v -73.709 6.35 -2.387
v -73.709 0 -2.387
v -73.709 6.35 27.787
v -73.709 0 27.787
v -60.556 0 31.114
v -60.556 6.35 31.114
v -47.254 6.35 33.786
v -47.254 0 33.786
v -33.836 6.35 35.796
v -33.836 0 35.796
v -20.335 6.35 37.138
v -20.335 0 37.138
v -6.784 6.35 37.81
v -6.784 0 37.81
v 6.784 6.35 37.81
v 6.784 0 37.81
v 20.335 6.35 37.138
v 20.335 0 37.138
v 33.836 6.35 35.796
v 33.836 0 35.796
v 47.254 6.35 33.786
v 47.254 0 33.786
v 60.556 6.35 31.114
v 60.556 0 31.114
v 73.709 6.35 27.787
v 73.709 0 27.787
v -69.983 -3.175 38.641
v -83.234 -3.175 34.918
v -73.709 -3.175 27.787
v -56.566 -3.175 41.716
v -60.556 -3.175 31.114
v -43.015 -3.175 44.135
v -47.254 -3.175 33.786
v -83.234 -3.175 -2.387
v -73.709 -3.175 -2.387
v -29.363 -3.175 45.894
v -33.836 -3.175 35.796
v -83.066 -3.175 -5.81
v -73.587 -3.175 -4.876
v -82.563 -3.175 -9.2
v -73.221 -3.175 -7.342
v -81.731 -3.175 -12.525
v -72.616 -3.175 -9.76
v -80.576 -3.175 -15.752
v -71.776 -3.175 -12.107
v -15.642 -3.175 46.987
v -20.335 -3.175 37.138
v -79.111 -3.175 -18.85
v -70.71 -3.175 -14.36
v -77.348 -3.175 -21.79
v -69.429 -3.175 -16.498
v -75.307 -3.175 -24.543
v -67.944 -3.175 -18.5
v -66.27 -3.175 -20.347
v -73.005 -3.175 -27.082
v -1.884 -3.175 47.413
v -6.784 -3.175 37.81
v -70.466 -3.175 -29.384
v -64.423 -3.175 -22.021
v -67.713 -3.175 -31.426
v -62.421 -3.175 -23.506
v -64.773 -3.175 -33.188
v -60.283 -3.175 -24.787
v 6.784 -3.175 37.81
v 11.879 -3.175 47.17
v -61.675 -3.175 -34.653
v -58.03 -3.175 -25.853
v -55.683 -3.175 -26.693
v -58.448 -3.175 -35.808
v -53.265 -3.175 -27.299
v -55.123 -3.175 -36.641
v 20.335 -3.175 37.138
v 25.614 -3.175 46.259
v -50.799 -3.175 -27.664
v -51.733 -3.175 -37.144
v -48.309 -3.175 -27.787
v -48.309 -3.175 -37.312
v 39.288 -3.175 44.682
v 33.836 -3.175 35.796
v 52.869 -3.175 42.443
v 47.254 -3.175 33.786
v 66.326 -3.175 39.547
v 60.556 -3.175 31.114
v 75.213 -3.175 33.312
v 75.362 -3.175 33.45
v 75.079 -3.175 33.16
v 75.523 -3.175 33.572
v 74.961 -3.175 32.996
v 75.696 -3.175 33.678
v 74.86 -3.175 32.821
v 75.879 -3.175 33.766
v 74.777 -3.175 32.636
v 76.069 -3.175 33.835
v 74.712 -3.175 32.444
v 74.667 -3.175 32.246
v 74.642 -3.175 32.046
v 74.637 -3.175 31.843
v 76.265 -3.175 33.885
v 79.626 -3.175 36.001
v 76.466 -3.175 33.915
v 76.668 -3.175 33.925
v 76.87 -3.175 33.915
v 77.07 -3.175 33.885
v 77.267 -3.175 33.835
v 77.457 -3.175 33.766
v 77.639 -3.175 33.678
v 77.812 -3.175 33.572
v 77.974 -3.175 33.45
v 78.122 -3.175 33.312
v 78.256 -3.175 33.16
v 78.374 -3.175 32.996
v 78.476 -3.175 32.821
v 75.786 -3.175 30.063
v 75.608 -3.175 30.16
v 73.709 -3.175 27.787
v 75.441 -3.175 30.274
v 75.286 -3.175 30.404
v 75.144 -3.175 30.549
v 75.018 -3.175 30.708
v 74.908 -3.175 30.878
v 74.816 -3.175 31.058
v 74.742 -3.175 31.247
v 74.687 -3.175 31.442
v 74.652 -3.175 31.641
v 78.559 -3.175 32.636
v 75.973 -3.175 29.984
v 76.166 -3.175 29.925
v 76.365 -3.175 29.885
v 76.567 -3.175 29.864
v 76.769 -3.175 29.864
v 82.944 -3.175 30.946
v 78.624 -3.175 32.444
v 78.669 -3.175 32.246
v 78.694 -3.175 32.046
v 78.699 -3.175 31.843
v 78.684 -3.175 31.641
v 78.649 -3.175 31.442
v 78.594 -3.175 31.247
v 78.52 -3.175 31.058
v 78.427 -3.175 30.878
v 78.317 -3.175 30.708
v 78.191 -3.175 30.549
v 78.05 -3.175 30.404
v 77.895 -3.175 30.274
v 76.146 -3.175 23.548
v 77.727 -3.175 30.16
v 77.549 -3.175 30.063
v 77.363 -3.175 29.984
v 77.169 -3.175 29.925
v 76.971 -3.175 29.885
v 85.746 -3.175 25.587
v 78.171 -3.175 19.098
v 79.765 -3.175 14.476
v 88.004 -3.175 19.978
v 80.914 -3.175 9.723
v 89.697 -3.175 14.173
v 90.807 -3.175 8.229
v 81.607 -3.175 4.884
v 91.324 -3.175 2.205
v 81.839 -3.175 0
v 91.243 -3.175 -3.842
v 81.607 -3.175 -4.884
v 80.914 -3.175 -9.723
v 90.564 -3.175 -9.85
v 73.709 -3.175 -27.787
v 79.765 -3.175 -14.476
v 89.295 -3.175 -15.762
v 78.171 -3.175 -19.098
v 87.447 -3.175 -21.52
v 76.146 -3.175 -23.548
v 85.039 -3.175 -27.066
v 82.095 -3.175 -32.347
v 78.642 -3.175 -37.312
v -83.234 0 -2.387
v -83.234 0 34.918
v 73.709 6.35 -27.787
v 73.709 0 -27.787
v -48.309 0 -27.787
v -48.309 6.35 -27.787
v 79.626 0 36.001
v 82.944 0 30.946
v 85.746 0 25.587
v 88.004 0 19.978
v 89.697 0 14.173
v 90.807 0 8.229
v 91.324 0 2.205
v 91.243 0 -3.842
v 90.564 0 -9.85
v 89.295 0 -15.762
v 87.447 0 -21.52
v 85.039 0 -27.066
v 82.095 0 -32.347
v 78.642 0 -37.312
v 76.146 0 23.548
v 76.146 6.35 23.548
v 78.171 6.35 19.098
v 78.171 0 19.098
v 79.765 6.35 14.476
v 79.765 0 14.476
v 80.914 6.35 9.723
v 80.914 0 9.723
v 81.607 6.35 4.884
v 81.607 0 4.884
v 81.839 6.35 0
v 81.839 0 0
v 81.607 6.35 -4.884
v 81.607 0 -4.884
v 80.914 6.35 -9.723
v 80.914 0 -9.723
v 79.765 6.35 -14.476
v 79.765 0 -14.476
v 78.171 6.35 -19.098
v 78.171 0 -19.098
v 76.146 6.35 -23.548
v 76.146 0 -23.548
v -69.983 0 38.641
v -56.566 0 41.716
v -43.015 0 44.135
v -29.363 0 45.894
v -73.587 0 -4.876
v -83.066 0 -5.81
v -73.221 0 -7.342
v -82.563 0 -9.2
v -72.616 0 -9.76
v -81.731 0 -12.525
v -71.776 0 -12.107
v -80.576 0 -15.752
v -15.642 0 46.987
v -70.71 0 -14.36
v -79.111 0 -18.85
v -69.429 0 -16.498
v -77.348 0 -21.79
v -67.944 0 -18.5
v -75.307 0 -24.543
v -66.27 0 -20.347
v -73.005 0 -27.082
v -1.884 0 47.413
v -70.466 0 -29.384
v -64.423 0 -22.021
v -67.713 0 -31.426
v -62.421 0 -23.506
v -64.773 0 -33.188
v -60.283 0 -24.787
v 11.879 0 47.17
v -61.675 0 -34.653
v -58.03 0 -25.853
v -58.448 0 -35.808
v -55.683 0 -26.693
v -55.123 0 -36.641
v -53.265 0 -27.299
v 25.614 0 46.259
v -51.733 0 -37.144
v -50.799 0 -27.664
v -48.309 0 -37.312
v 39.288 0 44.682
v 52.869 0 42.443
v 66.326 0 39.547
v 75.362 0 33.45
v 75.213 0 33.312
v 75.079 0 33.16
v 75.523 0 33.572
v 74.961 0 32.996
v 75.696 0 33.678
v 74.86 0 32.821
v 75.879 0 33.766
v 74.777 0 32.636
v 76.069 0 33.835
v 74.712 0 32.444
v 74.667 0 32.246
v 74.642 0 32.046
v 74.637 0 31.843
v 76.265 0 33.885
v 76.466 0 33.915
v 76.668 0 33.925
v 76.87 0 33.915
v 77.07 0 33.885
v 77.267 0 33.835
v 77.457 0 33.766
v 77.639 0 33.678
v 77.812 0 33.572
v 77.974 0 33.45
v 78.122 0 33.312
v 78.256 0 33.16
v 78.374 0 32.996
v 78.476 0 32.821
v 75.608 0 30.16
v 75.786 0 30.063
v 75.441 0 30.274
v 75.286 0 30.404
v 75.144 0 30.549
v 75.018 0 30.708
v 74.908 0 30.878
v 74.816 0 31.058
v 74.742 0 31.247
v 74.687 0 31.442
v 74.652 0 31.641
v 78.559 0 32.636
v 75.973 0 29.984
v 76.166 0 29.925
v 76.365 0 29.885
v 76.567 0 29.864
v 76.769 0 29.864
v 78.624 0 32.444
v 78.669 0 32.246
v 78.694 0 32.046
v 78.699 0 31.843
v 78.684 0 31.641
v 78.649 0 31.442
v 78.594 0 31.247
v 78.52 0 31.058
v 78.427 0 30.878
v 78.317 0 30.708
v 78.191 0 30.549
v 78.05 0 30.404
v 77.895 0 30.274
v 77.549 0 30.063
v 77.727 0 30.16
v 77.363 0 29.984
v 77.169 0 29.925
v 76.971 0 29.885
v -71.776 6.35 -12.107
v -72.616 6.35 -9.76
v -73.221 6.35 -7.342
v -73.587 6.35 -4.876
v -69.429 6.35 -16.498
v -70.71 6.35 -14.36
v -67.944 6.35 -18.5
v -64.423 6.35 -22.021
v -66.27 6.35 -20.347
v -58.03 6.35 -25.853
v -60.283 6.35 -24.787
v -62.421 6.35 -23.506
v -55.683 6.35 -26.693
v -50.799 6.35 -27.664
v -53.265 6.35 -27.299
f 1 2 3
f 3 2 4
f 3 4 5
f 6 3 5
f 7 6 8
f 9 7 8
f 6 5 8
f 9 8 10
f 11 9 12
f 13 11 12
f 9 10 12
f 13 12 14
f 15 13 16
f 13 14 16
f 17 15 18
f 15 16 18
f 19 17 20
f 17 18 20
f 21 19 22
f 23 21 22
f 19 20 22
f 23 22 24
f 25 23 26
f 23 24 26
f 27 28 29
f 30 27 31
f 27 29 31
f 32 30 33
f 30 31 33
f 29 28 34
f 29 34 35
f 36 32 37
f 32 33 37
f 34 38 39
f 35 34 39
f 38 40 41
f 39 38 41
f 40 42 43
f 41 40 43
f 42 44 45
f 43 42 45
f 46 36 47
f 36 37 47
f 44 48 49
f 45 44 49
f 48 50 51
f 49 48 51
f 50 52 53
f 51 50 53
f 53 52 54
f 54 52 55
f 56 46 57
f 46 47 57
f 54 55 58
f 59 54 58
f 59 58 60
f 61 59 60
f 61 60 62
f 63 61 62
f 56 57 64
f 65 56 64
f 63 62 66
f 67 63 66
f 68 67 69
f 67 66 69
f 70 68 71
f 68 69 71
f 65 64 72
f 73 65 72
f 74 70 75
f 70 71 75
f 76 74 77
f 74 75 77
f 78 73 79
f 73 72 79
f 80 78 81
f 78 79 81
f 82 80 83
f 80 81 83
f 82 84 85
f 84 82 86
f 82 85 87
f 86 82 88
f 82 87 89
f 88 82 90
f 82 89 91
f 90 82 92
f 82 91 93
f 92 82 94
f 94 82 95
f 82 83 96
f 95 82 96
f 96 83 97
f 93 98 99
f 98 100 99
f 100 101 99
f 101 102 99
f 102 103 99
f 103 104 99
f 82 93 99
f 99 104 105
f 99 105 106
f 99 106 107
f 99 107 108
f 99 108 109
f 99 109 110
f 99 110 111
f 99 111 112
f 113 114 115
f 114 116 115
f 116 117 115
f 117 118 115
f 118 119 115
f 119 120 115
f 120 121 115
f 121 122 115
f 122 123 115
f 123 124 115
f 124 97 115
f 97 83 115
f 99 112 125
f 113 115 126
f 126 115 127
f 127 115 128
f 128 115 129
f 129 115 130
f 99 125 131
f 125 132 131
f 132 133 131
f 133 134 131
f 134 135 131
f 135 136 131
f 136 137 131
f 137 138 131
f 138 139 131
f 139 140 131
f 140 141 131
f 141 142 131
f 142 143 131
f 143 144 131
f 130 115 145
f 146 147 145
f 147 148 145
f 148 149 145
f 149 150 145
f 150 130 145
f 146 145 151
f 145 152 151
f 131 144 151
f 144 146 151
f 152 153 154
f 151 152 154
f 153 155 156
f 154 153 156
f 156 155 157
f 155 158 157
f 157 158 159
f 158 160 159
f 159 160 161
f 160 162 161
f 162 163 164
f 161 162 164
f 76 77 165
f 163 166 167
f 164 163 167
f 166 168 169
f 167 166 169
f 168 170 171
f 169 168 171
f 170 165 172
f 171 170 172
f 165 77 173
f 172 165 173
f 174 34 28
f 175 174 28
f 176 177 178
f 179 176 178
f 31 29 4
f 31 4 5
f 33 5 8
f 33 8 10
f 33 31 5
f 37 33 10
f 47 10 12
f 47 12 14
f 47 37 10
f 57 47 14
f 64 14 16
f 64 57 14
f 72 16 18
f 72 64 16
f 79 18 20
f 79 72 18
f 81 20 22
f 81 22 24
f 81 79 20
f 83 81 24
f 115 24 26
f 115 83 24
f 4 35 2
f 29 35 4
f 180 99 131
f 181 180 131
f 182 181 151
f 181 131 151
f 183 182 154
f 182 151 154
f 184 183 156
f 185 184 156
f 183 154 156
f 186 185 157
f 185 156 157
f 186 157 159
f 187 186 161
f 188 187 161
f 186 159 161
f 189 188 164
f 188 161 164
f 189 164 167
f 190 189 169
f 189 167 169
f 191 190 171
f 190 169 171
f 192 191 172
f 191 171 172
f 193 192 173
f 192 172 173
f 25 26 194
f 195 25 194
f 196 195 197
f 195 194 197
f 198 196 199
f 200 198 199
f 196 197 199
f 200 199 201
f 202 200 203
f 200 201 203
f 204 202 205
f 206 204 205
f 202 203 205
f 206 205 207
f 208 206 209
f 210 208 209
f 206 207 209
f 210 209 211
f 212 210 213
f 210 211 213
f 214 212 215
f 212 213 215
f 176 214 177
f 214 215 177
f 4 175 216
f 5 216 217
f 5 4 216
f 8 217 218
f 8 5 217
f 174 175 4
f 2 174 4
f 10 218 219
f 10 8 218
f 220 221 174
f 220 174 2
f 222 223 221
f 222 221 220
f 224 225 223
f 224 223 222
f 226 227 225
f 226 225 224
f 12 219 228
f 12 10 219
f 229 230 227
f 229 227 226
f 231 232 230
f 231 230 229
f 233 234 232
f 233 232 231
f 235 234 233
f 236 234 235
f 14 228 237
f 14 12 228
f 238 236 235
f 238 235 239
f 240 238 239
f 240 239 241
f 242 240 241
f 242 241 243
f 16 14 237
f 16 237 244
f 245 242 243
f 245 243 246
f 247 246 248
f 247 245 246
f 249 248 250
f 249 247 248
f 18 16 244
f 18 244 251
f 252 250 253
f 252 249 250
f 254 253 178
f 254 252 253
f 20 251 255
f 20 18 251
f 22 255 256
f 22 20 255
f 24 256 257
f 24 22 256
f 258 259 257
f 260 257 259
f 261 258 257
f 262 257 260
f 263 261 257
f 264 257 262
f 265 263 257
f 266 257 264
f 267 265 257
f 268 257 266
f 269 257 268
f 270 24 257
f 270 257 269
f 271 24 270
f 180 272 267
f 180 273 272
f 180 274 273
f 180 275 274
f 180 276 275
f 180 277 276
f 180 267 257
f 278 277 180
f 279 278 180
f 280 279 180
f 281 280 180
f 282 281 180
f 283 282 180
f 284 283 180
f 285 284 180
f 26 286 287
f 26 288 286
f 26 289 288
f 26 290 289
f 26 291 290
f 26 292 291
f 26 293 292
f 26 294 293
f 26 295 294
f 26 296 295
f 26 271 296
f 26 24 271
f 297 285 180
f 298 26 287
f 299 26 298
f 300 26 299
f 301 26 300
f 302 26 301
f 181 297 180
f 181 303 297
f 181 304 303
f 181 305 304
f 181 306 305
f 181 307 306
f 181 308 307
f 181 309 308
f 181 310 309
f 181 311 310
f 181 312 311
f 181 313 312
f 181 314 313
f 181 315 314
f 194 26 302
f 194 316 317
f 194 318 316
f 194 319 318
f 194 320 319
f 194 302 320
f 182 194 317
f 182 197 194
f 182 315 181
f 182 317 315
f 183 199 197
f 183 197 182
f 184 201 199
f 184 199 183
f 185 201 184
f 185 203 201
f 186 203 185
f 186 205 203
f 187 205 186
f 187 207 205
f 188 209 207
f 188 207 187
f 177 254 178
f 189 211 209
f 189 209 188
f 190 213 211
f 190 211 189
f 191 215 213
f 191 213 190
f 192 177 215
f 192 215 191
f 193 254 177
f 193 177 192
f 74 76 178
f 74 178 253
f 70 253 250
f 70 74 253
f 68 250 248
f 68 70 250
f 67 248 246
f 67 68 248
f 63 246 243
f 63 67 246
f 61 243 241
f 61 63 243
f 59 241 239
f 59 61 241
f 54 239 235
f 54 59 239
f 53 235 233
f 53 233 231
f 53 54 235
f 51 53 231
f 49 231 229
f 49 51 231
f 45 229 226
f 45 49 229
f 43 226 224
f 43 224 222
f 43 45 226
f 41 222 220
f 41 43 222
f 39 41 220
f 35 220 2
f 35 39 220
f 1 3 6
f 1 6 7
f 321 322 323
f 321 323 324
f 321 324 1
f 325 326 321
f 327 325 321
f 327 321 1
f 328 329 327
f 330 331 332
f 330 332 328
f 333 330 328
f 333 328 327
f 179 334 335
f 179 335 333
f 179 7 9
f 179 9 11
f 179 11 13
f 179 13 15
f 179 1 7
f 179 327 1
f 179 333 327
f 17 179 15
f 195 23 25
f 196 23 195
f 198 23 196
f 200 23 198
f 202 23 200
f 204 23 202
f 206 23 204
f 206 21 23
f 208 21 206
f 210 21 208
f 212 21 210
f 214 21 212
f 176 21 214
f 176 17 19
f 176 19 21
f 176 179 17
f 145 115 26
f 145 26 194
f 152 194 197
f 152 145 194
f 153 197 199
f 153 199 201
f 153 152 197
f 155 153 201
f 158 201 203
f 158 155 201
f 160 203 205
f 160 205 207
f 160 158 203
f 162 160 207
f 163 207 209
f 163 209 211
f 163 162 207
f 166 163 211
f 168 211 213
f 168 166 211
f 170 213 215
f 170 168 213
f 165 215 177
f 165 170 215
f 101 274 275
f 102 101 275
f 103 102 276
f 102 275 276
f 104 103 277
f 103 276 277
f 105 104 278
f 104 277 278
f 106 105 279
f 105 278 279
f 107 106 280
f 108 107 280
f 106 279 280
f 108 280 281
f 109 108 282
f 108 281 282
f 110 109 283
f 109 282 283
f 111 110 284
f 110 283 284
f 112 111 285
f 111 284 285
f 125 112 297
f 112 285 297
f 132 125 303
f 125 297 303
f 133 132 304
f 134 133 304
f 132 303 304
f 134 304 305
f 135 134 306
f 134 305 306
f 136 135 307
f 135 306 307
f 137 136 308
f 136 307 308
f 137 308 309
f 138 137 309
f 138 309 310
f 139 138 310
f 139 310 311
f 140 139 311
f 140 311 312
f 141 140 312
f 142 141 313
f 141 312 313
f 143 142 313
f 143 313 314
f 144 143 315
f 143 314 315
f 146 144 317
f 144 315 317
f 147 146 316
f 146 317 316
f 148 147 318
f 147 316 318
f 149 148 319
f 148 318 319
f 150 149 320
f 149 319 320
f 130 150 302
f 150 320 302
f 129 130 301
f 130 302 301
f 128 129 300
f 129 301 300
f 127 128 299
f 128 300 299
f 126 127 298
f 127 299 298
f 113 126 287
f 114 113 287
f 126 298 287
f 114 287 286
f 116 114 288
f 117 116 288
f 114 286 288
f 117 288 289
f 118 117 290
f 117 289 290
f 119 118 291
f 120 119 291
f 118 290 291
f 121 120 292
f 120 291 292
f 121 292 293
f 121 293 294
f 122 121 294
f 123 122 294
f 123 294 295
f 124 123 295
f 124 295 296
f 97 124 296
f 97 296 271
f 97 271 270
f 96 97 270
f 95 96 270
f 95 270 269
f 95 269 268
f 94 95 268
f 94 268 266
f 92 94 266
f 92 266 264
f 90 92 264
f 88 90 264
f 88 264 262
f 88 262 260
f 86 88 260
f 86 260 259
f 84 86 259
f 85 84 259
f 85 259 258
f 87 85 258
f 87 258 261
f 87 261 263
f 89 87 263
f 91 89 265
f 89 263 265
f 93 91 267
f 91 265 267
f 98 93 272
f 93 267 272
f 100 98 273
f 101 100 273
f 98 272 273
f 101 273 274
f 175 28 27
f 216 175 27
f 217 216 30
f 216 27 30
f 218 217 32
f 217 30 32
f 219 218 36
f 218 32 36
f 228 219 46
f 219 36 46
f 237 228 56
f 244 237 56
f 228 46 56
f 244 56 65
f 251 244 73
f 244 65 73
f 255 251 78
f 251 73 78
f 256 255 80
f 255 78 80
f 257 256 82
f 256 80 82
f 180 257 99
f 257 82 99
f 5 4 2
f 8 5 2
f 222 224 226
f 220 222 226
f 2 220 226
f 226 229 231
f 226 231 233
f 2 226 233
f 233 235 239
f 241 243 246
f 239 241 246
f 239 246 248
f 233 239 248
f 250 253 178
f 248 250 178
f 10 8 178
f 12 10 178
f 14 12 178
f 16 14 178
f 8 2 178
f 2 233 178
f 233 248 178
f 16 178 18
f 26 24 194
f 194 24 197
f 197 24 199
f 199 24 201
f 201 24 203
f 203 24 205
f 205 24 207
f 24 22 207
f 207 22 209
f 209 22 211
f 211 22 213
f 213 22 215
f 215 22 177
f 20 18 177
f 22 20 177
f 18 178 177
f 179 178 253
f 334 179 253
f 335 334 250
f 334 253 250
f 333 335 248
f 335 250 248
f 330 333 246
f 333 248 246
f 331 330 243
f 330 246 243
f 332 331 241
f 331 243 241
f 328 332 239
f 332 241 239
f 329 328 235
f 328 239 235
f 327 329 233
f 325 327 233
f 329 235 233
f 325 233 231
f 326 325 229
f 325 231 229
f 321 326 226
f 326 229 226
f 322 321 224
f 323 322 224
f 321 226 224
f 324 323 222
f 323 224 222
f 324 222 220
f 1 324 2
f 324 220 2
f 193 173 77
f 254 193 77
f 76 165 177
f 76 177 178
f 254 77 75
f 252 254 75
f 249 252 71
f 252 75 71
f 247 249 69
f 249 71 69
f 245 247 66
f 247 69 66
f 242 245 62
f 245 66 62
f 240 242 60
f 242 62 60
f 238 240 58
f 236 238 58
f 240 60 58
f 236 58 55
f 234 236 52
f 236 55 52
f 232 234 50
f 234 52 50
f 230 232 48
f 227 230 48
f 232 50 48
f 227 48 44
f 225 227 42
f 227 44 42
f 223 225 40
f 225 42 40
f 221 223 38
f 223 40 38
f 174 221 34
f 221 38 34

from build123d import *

# Parameters (mm, degrees)
EXTRUDE1_DEPTH = 6.35
EXTRUDE2_START = -3.175
EXTRUDE2_DEPTH = 3.175
SKETCH3_R      = 2.031713538
EXTRUDE5_DEPTH = 3.175


with BuildPart() as part:
    # Sketch1 → Extrude1 (new body)
    with BuildSketch(Plane(origin=(0, 0, 0), x_dir=(1, 0, 0), z_dir=(0, 1, 0))):
        with BuildLine():
            Line((73.709423741, 27.78667426), (-48.309423741, 27.78667426))
            ThreePointArc((-48.309423741, 27.78667426), (-66.269935984, 20.347186502), (-73.709423741, 2.38667426))
            Line((-73.709423741, 2.38667426), (-73.709423741, -27.78667426))
            ThreePointArc((-73.709423741, -27.78667426), (0, -37.894231138), (73.709423741, -27.78667426))
            ThreePointArc((73.709423741, -27.78667426), (81.838779599, 0), (73.709423741, 27.78667426))
        make_face()
    extrude(amount=EXTRUDE1_DEPTH)


with BuildPart() as body_2:
    # Sketch2 → Extrude2 (new body)
    with BuildSketch(Plane(origin=(0, 0, 0), x_dir=(1, 0, 0), z_dir=(0, 1, 0)).offset(EXTRUDE2_START)):
        with BuildLine():
            Line((78.642387847, 37.31167426), (-48.309423741, 37.31167426))
            ThreePointArc((-48.309423741, 37.31167426), (-73.005128074, 27.082378593), (-83.234423741, 2.38667426))
            Line((-83.234423741, 2.38667426), (-83.234423741, -34.917995668))
            ThreePointArc((-83.234423741, -34.917995668), (-1.883597248, -47.412970192), (79.626163145, -36.000682065))
            ThreePointArc((79.626163145, -36.000682065), (91.358281231, 0.819529495), (78.642387847, 37.31167426))
        make_face()
        with BuildLine():
            Line((73.709423741, 27.78667426), (-48.309423741, 27.78667426))
            ThreePointArc((-48.309423741, 27.78667426), (-66.269935984, 20.347186502), (-73.709423741, 2.38667426))
            Line((-73.709423741, 2.38667426), (-73.709423741, -27.78667426))
            ThreePointArc((-73.709423741, -27.78667426), (0, -37.894231138), (73.709423741, -27.78667426))
            ThreePointArc((73.709423741, -27.78667426), (81.838779599, 0), (73.709423741, 27.78667426))
        make_face(mode=Mode.SUBTRACT)
    extrude(amount=EXTRUDE2_DEPTH)

    # Sketch3 → Extrude5 (cut)
    with BuildSketch(Plane(origin=(0, 0, 0), x_dir=(1, 0, 0), z_dir=(0, 1, 0))):
        with Locations(Location((76.667793443, -31.893678163, 0), (0, 0, 270))):
            Circle(SKETCH3_R)
    extrude(amount=-EXTRUDE5_DEPTH, mode=Mode.SUBTRACT)


solid = Compound([part.part, body_2.part])
